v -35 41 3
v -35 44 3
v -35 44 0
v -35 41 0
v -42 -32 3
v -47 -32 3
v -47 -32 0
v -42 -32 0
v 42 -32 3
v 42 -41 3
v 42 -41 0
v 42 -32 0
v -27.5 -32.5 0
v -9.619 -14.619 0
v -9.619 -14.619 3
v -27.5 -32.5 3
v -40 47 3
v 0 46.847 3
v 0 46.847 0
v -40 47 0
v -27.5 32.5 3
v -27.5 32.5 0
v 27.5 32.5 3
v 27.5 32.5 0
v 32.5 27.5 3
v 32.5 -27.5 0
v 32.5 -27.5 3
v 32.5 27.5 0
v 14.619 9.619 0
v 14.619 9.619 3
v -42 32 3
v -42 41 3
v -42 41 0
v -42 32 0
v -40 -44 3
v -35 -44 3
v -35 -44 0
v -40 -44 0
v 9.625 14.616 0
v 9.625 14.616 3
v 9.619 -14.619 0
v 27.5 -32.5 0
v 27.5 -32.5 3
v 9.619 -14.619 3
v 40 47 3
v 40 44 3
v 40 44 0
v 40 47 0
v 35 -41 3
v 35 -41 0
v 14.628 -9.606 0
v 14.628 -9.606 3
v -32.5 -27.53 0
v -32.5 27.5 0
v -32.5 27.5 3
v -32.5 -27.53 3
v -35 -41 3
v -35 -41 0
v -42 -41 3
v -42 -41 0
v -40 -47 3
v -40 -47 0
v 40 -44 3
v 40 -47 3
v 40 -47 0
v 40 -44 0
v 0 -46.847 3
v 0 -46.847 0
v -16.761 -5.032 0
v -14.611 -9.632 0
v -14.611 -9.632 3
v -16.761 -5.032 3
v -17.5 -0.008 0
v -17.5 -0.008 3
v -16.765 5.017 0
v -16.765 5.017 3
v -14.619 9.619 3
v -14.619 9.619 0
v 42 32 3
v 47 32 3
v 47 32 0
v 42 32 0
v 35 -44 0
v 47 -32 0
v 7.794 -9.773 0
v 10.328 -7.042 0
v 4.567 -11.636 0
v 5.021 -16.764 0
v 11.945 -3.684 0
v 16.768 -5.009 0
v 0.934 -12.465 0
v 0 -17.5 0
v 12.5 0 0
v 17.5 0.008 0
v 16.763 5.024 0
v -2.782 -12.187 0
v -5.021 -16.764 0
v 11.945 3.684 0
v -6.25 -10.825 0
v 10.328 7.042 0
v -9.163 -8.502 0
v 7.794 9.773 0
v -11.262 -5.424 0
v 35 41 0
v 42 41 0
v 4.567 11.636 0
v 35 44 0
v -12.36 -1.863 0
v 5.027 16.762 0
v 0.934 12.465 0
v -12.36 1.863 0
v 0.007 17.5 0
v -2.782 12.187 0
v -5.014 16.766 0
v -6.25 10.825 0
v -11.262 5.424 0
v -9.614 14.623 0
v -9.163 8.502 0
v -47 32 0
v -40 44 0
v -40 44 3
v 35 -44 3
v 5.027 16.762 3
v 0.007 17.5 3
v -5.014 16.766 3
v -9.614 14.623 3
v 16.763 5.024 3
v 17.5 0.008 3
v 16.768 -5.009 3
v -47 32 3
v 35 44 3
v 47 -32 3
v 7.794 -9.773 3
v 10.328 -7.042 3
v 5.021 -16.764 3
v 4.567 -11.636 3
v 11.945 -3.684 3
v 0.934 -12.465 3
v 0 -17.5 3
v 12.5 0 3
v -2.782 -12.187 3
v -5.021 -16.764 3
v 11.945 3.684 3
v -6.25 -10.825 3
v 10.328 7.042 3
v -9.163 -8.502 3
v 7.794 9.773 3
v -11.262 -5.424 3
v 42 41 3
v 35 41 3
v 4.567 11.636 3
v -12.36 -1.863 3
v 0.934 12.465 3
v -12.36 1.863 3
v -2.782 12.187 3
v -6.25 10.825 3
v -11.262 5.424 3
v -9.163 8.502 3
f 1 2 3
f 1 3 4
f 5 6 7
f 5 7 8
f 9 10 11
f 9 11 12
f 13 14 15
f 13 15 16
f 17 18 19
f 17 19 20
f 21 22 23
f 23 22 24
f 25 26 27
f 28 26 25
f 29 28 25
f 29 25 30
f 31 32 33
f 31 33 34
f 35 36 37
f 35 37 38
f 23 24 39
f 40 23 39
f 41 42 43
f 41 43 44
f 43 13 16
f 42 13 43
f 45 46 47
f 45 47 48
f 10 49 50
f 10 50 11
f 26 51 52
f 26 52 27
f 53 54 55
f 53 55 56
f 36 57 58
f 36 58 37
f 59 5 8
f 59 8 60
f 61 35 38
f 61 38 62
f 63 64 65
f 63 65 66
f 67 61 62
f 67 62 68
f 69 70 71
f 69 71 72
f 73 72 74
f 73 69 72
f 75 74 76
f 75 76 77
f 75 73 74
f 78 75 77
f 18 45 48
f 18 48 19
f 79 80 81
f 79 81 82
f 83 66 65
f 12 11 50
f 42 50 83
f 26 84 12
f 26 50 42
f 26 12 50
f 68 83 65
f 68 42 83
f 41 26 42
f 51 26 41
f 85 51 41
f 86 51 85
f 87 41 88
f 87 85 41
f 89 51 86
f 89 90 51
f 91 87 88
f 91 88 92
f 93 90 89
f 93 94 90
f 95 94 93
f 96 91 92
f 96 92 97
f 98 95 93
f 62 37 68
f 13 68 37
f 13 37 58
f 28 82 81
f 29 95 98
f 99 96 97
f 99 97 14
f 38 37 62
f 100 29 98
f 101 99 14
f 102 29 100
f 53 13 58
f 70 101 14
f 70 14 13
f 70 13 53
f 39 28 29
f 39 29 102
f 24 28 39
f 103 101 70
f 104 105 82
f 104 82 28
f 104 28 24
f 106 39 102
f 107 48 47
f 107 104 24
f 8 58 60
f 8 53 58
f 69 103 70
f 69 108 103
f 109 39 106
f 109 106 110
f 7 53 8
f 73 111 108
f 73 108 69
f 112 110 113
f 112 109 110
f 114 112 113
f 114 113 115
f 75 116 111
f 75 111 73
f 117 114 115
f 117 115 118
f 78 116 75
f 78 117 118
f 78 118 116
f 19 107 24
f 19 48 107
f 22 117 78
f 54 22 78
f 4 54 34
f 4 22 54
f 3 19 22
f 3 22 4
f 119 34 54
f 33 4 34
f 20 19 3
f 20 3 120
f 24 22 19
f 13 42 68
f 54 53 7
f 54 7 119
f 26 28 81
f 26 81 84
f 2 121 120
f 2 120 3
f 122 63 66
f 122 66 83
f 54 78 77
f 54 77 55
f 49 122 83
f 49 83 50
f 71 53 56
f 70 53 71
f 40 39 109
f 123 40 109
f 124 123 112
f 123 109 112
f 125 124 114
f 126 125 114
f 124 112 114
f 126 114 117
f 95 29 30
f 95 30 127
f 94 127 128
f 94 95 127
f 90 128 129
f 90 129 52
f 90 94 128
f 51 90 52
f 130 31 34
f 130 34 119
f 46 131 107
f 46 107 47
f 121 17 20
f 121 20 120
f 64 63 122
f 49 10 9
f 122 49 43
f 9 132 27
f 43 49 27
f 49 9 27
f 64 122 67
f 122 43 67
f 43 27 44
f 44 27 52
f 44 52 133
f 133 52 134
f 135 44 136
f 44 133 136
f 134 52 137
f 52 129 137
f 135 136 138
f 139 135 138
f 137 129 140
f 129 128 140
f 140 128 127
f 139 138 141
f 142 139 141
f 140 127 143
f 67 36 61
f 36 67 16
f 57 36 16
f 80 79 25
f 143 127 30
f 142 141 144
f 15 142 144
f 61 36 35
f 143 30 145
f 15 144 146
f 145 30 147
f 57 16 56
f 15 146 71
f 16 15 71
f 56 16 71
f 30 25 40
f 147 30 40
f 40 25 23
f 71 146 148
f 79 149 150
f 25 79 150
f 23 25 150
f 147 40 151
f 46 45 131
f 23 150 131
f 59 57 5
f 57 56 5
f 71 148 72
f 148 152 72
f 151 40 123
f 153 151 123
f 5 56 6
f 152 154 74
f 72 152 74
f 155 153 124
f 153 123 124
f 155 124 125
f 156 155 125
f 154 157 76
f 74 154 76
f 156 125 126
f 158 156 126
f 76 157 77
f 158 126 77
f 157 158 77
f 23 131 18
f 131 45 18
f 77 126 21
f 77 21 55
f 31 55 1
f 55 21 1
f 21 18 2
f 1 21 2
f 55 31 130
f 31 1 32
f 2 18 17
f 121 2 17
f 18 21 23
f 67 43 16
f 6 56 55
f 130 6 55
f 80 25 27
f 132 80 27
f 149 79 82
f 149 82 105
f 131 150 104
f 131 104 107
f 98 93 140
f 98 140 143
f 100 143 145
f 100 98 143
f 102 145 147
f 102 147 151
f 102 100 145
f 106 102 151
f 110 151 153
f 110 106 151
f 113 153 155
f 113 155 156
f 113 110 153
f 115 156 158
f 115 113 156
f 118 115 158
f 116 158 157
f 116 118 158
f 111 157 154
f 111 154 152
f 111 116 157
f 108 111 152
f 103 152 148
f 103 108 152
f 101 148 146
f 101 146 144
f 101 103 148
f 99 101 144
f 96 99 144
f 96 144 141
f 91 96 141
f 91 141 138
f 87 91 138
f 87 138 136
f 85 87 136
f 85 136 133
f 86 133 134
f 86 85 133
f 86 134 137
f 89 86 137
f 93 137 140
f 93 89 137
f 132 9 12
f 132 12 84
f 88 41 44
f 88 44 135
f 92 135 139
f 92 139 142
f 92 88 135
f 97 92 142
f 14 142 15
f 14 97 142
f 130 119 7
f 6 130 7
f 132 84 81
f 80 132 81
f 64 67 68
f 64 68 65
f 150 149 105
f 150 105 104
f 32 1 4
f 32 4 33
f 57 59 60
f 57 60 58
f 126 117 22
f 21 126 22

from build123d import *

# Parameters (mm, degrees)
SKETCH1_R               = 12.5
BOSS_EXTRUDE4_DEPTH     = 3
CUT_EXTRUDE_THIN3_START = -3
CUT_EXTRUDE_THIN3_DEPTH = 3


# Read off the part's stored shape, not the designer's step: Cut-Extrude-Thin3
with BuildPart() as part:
    # Sketch1 → Boss-Extrude4 (new body)
    with BuildSketch(Plane.XY):
        Polygon((-40, 47), (40, 47), (47, 47), (47, 40), (47, -40), (47, -47), (40, -47), (-40, -47), (-47, -47), (-47, -40), (-47, 40), (-47, 47), align=None)
        Circle(SKETCH1_R, mode=Mode.SUBTRACT)
        with BuildLine():
            Line((-27.5, 32.5), (27.5, 32.5))
            Line((27.5, 32.5), (9.624571705, 14.615663498))
            ThreePointArc((9.624571705, 14.615663498), (0.00658569, 17.499998761), (-9.613568497, 14.622903294))
            Line((-9.613568497, 14.622903294), (-27.5, 32.5))
        make_face(mode=Mode.SUBTRACT)
        with BuildLine():
            Line((-32.5, 27.5), (-32.5, -27.529900959))
            Line((-32.5, -27.529900959), (-14.610866481, -9.631852402))
            ThreePointArc((-14.610866481, -9.631852402), (-17.49999836, -0.007575188), (-14.619199644, 9.619199644))
            Line((-14.619199644, 9.619199644), (-32.5, 27.5))
        make_face(mode=Mode.SUBTRACT)
        with BuildLine():
            Line((-27.5, -32.5), (27.5, -32.5))
            Line((27.5, -32.5), (9.619199644, -14.619199644))
            ThreePointArc((9.619199644, -14.619199644), (0, -17.5), (-9.619199644, -14.619199644))
            Line((-9.619199644, -14.619199644), (-27.5, -32.5))
        make_face(mode=Mode.SUBTRACT)
        with BuildLine():
            Line((32.5, 27.5), (14.619199644, 9.619199644))
            ThreePointArc((14.619199644, 9.619199644), (17.4999982, 0.007937724), (14.627919862, -9.60593361))
            Line((14.627919862, -9.60593361), (32.5, -27.5))
            Line((32.5, -27.5), (32.5, 27.5))
        make_face(mode=Mode.SUBTRACT)
    extrude(amount=BOSS_EXTRUDE4_DEPTH)

    # Cut-Extrude-Thin3 outline → Cut-Extrude-Thin3 (cut)
    with BuildSketch(Plane(origin=(0, 0, 0), x_dir=(-1, 0, 0), z_dir=(0, 0, -1)).offset(CUT_EXTRUDE_THIN3_START)):
        Polygon((-42, -41), (-42, -32), (-47, -32), (-47, -47), (-39.999705668, -47), (-39.999705668, -44), (-34.999705668, -44), (-34.999705668, -41), align=None)
        Polygon((-47, 47), (-47, 32), (-42, 32), (-42, 41), (-34.999705668, 41), (-34.999705668, 44), (-39.999705668, 44), (-39.999705668, 47), align=None)
        Polygon((0, -46.846551451), (-39.999705668, -47), (39.999705668, -47), align=None)
        Polygon((39.999705668, -44), (39.999705668, -47), (47, -47), (47, -32), (42, -32), (42, -41), (34.999705668, -41), (34.999705668, -44), align=None)
        Polygon((39.999705668, 47), (-39.999705668, 47), (0, 46.846551451), align=None)
        Polygon((47, 47), (39.999705668, 47), (39.999705668, 44), (34.999705668, 44), (34.999705668, 41), (42, 41), (42, 32), (47, 32), align=None)
    extrude(amount=CUT_EXTRUDE_THIN3_DEPTH, mode=Mode.SUBTRACT)


solid = part.part
